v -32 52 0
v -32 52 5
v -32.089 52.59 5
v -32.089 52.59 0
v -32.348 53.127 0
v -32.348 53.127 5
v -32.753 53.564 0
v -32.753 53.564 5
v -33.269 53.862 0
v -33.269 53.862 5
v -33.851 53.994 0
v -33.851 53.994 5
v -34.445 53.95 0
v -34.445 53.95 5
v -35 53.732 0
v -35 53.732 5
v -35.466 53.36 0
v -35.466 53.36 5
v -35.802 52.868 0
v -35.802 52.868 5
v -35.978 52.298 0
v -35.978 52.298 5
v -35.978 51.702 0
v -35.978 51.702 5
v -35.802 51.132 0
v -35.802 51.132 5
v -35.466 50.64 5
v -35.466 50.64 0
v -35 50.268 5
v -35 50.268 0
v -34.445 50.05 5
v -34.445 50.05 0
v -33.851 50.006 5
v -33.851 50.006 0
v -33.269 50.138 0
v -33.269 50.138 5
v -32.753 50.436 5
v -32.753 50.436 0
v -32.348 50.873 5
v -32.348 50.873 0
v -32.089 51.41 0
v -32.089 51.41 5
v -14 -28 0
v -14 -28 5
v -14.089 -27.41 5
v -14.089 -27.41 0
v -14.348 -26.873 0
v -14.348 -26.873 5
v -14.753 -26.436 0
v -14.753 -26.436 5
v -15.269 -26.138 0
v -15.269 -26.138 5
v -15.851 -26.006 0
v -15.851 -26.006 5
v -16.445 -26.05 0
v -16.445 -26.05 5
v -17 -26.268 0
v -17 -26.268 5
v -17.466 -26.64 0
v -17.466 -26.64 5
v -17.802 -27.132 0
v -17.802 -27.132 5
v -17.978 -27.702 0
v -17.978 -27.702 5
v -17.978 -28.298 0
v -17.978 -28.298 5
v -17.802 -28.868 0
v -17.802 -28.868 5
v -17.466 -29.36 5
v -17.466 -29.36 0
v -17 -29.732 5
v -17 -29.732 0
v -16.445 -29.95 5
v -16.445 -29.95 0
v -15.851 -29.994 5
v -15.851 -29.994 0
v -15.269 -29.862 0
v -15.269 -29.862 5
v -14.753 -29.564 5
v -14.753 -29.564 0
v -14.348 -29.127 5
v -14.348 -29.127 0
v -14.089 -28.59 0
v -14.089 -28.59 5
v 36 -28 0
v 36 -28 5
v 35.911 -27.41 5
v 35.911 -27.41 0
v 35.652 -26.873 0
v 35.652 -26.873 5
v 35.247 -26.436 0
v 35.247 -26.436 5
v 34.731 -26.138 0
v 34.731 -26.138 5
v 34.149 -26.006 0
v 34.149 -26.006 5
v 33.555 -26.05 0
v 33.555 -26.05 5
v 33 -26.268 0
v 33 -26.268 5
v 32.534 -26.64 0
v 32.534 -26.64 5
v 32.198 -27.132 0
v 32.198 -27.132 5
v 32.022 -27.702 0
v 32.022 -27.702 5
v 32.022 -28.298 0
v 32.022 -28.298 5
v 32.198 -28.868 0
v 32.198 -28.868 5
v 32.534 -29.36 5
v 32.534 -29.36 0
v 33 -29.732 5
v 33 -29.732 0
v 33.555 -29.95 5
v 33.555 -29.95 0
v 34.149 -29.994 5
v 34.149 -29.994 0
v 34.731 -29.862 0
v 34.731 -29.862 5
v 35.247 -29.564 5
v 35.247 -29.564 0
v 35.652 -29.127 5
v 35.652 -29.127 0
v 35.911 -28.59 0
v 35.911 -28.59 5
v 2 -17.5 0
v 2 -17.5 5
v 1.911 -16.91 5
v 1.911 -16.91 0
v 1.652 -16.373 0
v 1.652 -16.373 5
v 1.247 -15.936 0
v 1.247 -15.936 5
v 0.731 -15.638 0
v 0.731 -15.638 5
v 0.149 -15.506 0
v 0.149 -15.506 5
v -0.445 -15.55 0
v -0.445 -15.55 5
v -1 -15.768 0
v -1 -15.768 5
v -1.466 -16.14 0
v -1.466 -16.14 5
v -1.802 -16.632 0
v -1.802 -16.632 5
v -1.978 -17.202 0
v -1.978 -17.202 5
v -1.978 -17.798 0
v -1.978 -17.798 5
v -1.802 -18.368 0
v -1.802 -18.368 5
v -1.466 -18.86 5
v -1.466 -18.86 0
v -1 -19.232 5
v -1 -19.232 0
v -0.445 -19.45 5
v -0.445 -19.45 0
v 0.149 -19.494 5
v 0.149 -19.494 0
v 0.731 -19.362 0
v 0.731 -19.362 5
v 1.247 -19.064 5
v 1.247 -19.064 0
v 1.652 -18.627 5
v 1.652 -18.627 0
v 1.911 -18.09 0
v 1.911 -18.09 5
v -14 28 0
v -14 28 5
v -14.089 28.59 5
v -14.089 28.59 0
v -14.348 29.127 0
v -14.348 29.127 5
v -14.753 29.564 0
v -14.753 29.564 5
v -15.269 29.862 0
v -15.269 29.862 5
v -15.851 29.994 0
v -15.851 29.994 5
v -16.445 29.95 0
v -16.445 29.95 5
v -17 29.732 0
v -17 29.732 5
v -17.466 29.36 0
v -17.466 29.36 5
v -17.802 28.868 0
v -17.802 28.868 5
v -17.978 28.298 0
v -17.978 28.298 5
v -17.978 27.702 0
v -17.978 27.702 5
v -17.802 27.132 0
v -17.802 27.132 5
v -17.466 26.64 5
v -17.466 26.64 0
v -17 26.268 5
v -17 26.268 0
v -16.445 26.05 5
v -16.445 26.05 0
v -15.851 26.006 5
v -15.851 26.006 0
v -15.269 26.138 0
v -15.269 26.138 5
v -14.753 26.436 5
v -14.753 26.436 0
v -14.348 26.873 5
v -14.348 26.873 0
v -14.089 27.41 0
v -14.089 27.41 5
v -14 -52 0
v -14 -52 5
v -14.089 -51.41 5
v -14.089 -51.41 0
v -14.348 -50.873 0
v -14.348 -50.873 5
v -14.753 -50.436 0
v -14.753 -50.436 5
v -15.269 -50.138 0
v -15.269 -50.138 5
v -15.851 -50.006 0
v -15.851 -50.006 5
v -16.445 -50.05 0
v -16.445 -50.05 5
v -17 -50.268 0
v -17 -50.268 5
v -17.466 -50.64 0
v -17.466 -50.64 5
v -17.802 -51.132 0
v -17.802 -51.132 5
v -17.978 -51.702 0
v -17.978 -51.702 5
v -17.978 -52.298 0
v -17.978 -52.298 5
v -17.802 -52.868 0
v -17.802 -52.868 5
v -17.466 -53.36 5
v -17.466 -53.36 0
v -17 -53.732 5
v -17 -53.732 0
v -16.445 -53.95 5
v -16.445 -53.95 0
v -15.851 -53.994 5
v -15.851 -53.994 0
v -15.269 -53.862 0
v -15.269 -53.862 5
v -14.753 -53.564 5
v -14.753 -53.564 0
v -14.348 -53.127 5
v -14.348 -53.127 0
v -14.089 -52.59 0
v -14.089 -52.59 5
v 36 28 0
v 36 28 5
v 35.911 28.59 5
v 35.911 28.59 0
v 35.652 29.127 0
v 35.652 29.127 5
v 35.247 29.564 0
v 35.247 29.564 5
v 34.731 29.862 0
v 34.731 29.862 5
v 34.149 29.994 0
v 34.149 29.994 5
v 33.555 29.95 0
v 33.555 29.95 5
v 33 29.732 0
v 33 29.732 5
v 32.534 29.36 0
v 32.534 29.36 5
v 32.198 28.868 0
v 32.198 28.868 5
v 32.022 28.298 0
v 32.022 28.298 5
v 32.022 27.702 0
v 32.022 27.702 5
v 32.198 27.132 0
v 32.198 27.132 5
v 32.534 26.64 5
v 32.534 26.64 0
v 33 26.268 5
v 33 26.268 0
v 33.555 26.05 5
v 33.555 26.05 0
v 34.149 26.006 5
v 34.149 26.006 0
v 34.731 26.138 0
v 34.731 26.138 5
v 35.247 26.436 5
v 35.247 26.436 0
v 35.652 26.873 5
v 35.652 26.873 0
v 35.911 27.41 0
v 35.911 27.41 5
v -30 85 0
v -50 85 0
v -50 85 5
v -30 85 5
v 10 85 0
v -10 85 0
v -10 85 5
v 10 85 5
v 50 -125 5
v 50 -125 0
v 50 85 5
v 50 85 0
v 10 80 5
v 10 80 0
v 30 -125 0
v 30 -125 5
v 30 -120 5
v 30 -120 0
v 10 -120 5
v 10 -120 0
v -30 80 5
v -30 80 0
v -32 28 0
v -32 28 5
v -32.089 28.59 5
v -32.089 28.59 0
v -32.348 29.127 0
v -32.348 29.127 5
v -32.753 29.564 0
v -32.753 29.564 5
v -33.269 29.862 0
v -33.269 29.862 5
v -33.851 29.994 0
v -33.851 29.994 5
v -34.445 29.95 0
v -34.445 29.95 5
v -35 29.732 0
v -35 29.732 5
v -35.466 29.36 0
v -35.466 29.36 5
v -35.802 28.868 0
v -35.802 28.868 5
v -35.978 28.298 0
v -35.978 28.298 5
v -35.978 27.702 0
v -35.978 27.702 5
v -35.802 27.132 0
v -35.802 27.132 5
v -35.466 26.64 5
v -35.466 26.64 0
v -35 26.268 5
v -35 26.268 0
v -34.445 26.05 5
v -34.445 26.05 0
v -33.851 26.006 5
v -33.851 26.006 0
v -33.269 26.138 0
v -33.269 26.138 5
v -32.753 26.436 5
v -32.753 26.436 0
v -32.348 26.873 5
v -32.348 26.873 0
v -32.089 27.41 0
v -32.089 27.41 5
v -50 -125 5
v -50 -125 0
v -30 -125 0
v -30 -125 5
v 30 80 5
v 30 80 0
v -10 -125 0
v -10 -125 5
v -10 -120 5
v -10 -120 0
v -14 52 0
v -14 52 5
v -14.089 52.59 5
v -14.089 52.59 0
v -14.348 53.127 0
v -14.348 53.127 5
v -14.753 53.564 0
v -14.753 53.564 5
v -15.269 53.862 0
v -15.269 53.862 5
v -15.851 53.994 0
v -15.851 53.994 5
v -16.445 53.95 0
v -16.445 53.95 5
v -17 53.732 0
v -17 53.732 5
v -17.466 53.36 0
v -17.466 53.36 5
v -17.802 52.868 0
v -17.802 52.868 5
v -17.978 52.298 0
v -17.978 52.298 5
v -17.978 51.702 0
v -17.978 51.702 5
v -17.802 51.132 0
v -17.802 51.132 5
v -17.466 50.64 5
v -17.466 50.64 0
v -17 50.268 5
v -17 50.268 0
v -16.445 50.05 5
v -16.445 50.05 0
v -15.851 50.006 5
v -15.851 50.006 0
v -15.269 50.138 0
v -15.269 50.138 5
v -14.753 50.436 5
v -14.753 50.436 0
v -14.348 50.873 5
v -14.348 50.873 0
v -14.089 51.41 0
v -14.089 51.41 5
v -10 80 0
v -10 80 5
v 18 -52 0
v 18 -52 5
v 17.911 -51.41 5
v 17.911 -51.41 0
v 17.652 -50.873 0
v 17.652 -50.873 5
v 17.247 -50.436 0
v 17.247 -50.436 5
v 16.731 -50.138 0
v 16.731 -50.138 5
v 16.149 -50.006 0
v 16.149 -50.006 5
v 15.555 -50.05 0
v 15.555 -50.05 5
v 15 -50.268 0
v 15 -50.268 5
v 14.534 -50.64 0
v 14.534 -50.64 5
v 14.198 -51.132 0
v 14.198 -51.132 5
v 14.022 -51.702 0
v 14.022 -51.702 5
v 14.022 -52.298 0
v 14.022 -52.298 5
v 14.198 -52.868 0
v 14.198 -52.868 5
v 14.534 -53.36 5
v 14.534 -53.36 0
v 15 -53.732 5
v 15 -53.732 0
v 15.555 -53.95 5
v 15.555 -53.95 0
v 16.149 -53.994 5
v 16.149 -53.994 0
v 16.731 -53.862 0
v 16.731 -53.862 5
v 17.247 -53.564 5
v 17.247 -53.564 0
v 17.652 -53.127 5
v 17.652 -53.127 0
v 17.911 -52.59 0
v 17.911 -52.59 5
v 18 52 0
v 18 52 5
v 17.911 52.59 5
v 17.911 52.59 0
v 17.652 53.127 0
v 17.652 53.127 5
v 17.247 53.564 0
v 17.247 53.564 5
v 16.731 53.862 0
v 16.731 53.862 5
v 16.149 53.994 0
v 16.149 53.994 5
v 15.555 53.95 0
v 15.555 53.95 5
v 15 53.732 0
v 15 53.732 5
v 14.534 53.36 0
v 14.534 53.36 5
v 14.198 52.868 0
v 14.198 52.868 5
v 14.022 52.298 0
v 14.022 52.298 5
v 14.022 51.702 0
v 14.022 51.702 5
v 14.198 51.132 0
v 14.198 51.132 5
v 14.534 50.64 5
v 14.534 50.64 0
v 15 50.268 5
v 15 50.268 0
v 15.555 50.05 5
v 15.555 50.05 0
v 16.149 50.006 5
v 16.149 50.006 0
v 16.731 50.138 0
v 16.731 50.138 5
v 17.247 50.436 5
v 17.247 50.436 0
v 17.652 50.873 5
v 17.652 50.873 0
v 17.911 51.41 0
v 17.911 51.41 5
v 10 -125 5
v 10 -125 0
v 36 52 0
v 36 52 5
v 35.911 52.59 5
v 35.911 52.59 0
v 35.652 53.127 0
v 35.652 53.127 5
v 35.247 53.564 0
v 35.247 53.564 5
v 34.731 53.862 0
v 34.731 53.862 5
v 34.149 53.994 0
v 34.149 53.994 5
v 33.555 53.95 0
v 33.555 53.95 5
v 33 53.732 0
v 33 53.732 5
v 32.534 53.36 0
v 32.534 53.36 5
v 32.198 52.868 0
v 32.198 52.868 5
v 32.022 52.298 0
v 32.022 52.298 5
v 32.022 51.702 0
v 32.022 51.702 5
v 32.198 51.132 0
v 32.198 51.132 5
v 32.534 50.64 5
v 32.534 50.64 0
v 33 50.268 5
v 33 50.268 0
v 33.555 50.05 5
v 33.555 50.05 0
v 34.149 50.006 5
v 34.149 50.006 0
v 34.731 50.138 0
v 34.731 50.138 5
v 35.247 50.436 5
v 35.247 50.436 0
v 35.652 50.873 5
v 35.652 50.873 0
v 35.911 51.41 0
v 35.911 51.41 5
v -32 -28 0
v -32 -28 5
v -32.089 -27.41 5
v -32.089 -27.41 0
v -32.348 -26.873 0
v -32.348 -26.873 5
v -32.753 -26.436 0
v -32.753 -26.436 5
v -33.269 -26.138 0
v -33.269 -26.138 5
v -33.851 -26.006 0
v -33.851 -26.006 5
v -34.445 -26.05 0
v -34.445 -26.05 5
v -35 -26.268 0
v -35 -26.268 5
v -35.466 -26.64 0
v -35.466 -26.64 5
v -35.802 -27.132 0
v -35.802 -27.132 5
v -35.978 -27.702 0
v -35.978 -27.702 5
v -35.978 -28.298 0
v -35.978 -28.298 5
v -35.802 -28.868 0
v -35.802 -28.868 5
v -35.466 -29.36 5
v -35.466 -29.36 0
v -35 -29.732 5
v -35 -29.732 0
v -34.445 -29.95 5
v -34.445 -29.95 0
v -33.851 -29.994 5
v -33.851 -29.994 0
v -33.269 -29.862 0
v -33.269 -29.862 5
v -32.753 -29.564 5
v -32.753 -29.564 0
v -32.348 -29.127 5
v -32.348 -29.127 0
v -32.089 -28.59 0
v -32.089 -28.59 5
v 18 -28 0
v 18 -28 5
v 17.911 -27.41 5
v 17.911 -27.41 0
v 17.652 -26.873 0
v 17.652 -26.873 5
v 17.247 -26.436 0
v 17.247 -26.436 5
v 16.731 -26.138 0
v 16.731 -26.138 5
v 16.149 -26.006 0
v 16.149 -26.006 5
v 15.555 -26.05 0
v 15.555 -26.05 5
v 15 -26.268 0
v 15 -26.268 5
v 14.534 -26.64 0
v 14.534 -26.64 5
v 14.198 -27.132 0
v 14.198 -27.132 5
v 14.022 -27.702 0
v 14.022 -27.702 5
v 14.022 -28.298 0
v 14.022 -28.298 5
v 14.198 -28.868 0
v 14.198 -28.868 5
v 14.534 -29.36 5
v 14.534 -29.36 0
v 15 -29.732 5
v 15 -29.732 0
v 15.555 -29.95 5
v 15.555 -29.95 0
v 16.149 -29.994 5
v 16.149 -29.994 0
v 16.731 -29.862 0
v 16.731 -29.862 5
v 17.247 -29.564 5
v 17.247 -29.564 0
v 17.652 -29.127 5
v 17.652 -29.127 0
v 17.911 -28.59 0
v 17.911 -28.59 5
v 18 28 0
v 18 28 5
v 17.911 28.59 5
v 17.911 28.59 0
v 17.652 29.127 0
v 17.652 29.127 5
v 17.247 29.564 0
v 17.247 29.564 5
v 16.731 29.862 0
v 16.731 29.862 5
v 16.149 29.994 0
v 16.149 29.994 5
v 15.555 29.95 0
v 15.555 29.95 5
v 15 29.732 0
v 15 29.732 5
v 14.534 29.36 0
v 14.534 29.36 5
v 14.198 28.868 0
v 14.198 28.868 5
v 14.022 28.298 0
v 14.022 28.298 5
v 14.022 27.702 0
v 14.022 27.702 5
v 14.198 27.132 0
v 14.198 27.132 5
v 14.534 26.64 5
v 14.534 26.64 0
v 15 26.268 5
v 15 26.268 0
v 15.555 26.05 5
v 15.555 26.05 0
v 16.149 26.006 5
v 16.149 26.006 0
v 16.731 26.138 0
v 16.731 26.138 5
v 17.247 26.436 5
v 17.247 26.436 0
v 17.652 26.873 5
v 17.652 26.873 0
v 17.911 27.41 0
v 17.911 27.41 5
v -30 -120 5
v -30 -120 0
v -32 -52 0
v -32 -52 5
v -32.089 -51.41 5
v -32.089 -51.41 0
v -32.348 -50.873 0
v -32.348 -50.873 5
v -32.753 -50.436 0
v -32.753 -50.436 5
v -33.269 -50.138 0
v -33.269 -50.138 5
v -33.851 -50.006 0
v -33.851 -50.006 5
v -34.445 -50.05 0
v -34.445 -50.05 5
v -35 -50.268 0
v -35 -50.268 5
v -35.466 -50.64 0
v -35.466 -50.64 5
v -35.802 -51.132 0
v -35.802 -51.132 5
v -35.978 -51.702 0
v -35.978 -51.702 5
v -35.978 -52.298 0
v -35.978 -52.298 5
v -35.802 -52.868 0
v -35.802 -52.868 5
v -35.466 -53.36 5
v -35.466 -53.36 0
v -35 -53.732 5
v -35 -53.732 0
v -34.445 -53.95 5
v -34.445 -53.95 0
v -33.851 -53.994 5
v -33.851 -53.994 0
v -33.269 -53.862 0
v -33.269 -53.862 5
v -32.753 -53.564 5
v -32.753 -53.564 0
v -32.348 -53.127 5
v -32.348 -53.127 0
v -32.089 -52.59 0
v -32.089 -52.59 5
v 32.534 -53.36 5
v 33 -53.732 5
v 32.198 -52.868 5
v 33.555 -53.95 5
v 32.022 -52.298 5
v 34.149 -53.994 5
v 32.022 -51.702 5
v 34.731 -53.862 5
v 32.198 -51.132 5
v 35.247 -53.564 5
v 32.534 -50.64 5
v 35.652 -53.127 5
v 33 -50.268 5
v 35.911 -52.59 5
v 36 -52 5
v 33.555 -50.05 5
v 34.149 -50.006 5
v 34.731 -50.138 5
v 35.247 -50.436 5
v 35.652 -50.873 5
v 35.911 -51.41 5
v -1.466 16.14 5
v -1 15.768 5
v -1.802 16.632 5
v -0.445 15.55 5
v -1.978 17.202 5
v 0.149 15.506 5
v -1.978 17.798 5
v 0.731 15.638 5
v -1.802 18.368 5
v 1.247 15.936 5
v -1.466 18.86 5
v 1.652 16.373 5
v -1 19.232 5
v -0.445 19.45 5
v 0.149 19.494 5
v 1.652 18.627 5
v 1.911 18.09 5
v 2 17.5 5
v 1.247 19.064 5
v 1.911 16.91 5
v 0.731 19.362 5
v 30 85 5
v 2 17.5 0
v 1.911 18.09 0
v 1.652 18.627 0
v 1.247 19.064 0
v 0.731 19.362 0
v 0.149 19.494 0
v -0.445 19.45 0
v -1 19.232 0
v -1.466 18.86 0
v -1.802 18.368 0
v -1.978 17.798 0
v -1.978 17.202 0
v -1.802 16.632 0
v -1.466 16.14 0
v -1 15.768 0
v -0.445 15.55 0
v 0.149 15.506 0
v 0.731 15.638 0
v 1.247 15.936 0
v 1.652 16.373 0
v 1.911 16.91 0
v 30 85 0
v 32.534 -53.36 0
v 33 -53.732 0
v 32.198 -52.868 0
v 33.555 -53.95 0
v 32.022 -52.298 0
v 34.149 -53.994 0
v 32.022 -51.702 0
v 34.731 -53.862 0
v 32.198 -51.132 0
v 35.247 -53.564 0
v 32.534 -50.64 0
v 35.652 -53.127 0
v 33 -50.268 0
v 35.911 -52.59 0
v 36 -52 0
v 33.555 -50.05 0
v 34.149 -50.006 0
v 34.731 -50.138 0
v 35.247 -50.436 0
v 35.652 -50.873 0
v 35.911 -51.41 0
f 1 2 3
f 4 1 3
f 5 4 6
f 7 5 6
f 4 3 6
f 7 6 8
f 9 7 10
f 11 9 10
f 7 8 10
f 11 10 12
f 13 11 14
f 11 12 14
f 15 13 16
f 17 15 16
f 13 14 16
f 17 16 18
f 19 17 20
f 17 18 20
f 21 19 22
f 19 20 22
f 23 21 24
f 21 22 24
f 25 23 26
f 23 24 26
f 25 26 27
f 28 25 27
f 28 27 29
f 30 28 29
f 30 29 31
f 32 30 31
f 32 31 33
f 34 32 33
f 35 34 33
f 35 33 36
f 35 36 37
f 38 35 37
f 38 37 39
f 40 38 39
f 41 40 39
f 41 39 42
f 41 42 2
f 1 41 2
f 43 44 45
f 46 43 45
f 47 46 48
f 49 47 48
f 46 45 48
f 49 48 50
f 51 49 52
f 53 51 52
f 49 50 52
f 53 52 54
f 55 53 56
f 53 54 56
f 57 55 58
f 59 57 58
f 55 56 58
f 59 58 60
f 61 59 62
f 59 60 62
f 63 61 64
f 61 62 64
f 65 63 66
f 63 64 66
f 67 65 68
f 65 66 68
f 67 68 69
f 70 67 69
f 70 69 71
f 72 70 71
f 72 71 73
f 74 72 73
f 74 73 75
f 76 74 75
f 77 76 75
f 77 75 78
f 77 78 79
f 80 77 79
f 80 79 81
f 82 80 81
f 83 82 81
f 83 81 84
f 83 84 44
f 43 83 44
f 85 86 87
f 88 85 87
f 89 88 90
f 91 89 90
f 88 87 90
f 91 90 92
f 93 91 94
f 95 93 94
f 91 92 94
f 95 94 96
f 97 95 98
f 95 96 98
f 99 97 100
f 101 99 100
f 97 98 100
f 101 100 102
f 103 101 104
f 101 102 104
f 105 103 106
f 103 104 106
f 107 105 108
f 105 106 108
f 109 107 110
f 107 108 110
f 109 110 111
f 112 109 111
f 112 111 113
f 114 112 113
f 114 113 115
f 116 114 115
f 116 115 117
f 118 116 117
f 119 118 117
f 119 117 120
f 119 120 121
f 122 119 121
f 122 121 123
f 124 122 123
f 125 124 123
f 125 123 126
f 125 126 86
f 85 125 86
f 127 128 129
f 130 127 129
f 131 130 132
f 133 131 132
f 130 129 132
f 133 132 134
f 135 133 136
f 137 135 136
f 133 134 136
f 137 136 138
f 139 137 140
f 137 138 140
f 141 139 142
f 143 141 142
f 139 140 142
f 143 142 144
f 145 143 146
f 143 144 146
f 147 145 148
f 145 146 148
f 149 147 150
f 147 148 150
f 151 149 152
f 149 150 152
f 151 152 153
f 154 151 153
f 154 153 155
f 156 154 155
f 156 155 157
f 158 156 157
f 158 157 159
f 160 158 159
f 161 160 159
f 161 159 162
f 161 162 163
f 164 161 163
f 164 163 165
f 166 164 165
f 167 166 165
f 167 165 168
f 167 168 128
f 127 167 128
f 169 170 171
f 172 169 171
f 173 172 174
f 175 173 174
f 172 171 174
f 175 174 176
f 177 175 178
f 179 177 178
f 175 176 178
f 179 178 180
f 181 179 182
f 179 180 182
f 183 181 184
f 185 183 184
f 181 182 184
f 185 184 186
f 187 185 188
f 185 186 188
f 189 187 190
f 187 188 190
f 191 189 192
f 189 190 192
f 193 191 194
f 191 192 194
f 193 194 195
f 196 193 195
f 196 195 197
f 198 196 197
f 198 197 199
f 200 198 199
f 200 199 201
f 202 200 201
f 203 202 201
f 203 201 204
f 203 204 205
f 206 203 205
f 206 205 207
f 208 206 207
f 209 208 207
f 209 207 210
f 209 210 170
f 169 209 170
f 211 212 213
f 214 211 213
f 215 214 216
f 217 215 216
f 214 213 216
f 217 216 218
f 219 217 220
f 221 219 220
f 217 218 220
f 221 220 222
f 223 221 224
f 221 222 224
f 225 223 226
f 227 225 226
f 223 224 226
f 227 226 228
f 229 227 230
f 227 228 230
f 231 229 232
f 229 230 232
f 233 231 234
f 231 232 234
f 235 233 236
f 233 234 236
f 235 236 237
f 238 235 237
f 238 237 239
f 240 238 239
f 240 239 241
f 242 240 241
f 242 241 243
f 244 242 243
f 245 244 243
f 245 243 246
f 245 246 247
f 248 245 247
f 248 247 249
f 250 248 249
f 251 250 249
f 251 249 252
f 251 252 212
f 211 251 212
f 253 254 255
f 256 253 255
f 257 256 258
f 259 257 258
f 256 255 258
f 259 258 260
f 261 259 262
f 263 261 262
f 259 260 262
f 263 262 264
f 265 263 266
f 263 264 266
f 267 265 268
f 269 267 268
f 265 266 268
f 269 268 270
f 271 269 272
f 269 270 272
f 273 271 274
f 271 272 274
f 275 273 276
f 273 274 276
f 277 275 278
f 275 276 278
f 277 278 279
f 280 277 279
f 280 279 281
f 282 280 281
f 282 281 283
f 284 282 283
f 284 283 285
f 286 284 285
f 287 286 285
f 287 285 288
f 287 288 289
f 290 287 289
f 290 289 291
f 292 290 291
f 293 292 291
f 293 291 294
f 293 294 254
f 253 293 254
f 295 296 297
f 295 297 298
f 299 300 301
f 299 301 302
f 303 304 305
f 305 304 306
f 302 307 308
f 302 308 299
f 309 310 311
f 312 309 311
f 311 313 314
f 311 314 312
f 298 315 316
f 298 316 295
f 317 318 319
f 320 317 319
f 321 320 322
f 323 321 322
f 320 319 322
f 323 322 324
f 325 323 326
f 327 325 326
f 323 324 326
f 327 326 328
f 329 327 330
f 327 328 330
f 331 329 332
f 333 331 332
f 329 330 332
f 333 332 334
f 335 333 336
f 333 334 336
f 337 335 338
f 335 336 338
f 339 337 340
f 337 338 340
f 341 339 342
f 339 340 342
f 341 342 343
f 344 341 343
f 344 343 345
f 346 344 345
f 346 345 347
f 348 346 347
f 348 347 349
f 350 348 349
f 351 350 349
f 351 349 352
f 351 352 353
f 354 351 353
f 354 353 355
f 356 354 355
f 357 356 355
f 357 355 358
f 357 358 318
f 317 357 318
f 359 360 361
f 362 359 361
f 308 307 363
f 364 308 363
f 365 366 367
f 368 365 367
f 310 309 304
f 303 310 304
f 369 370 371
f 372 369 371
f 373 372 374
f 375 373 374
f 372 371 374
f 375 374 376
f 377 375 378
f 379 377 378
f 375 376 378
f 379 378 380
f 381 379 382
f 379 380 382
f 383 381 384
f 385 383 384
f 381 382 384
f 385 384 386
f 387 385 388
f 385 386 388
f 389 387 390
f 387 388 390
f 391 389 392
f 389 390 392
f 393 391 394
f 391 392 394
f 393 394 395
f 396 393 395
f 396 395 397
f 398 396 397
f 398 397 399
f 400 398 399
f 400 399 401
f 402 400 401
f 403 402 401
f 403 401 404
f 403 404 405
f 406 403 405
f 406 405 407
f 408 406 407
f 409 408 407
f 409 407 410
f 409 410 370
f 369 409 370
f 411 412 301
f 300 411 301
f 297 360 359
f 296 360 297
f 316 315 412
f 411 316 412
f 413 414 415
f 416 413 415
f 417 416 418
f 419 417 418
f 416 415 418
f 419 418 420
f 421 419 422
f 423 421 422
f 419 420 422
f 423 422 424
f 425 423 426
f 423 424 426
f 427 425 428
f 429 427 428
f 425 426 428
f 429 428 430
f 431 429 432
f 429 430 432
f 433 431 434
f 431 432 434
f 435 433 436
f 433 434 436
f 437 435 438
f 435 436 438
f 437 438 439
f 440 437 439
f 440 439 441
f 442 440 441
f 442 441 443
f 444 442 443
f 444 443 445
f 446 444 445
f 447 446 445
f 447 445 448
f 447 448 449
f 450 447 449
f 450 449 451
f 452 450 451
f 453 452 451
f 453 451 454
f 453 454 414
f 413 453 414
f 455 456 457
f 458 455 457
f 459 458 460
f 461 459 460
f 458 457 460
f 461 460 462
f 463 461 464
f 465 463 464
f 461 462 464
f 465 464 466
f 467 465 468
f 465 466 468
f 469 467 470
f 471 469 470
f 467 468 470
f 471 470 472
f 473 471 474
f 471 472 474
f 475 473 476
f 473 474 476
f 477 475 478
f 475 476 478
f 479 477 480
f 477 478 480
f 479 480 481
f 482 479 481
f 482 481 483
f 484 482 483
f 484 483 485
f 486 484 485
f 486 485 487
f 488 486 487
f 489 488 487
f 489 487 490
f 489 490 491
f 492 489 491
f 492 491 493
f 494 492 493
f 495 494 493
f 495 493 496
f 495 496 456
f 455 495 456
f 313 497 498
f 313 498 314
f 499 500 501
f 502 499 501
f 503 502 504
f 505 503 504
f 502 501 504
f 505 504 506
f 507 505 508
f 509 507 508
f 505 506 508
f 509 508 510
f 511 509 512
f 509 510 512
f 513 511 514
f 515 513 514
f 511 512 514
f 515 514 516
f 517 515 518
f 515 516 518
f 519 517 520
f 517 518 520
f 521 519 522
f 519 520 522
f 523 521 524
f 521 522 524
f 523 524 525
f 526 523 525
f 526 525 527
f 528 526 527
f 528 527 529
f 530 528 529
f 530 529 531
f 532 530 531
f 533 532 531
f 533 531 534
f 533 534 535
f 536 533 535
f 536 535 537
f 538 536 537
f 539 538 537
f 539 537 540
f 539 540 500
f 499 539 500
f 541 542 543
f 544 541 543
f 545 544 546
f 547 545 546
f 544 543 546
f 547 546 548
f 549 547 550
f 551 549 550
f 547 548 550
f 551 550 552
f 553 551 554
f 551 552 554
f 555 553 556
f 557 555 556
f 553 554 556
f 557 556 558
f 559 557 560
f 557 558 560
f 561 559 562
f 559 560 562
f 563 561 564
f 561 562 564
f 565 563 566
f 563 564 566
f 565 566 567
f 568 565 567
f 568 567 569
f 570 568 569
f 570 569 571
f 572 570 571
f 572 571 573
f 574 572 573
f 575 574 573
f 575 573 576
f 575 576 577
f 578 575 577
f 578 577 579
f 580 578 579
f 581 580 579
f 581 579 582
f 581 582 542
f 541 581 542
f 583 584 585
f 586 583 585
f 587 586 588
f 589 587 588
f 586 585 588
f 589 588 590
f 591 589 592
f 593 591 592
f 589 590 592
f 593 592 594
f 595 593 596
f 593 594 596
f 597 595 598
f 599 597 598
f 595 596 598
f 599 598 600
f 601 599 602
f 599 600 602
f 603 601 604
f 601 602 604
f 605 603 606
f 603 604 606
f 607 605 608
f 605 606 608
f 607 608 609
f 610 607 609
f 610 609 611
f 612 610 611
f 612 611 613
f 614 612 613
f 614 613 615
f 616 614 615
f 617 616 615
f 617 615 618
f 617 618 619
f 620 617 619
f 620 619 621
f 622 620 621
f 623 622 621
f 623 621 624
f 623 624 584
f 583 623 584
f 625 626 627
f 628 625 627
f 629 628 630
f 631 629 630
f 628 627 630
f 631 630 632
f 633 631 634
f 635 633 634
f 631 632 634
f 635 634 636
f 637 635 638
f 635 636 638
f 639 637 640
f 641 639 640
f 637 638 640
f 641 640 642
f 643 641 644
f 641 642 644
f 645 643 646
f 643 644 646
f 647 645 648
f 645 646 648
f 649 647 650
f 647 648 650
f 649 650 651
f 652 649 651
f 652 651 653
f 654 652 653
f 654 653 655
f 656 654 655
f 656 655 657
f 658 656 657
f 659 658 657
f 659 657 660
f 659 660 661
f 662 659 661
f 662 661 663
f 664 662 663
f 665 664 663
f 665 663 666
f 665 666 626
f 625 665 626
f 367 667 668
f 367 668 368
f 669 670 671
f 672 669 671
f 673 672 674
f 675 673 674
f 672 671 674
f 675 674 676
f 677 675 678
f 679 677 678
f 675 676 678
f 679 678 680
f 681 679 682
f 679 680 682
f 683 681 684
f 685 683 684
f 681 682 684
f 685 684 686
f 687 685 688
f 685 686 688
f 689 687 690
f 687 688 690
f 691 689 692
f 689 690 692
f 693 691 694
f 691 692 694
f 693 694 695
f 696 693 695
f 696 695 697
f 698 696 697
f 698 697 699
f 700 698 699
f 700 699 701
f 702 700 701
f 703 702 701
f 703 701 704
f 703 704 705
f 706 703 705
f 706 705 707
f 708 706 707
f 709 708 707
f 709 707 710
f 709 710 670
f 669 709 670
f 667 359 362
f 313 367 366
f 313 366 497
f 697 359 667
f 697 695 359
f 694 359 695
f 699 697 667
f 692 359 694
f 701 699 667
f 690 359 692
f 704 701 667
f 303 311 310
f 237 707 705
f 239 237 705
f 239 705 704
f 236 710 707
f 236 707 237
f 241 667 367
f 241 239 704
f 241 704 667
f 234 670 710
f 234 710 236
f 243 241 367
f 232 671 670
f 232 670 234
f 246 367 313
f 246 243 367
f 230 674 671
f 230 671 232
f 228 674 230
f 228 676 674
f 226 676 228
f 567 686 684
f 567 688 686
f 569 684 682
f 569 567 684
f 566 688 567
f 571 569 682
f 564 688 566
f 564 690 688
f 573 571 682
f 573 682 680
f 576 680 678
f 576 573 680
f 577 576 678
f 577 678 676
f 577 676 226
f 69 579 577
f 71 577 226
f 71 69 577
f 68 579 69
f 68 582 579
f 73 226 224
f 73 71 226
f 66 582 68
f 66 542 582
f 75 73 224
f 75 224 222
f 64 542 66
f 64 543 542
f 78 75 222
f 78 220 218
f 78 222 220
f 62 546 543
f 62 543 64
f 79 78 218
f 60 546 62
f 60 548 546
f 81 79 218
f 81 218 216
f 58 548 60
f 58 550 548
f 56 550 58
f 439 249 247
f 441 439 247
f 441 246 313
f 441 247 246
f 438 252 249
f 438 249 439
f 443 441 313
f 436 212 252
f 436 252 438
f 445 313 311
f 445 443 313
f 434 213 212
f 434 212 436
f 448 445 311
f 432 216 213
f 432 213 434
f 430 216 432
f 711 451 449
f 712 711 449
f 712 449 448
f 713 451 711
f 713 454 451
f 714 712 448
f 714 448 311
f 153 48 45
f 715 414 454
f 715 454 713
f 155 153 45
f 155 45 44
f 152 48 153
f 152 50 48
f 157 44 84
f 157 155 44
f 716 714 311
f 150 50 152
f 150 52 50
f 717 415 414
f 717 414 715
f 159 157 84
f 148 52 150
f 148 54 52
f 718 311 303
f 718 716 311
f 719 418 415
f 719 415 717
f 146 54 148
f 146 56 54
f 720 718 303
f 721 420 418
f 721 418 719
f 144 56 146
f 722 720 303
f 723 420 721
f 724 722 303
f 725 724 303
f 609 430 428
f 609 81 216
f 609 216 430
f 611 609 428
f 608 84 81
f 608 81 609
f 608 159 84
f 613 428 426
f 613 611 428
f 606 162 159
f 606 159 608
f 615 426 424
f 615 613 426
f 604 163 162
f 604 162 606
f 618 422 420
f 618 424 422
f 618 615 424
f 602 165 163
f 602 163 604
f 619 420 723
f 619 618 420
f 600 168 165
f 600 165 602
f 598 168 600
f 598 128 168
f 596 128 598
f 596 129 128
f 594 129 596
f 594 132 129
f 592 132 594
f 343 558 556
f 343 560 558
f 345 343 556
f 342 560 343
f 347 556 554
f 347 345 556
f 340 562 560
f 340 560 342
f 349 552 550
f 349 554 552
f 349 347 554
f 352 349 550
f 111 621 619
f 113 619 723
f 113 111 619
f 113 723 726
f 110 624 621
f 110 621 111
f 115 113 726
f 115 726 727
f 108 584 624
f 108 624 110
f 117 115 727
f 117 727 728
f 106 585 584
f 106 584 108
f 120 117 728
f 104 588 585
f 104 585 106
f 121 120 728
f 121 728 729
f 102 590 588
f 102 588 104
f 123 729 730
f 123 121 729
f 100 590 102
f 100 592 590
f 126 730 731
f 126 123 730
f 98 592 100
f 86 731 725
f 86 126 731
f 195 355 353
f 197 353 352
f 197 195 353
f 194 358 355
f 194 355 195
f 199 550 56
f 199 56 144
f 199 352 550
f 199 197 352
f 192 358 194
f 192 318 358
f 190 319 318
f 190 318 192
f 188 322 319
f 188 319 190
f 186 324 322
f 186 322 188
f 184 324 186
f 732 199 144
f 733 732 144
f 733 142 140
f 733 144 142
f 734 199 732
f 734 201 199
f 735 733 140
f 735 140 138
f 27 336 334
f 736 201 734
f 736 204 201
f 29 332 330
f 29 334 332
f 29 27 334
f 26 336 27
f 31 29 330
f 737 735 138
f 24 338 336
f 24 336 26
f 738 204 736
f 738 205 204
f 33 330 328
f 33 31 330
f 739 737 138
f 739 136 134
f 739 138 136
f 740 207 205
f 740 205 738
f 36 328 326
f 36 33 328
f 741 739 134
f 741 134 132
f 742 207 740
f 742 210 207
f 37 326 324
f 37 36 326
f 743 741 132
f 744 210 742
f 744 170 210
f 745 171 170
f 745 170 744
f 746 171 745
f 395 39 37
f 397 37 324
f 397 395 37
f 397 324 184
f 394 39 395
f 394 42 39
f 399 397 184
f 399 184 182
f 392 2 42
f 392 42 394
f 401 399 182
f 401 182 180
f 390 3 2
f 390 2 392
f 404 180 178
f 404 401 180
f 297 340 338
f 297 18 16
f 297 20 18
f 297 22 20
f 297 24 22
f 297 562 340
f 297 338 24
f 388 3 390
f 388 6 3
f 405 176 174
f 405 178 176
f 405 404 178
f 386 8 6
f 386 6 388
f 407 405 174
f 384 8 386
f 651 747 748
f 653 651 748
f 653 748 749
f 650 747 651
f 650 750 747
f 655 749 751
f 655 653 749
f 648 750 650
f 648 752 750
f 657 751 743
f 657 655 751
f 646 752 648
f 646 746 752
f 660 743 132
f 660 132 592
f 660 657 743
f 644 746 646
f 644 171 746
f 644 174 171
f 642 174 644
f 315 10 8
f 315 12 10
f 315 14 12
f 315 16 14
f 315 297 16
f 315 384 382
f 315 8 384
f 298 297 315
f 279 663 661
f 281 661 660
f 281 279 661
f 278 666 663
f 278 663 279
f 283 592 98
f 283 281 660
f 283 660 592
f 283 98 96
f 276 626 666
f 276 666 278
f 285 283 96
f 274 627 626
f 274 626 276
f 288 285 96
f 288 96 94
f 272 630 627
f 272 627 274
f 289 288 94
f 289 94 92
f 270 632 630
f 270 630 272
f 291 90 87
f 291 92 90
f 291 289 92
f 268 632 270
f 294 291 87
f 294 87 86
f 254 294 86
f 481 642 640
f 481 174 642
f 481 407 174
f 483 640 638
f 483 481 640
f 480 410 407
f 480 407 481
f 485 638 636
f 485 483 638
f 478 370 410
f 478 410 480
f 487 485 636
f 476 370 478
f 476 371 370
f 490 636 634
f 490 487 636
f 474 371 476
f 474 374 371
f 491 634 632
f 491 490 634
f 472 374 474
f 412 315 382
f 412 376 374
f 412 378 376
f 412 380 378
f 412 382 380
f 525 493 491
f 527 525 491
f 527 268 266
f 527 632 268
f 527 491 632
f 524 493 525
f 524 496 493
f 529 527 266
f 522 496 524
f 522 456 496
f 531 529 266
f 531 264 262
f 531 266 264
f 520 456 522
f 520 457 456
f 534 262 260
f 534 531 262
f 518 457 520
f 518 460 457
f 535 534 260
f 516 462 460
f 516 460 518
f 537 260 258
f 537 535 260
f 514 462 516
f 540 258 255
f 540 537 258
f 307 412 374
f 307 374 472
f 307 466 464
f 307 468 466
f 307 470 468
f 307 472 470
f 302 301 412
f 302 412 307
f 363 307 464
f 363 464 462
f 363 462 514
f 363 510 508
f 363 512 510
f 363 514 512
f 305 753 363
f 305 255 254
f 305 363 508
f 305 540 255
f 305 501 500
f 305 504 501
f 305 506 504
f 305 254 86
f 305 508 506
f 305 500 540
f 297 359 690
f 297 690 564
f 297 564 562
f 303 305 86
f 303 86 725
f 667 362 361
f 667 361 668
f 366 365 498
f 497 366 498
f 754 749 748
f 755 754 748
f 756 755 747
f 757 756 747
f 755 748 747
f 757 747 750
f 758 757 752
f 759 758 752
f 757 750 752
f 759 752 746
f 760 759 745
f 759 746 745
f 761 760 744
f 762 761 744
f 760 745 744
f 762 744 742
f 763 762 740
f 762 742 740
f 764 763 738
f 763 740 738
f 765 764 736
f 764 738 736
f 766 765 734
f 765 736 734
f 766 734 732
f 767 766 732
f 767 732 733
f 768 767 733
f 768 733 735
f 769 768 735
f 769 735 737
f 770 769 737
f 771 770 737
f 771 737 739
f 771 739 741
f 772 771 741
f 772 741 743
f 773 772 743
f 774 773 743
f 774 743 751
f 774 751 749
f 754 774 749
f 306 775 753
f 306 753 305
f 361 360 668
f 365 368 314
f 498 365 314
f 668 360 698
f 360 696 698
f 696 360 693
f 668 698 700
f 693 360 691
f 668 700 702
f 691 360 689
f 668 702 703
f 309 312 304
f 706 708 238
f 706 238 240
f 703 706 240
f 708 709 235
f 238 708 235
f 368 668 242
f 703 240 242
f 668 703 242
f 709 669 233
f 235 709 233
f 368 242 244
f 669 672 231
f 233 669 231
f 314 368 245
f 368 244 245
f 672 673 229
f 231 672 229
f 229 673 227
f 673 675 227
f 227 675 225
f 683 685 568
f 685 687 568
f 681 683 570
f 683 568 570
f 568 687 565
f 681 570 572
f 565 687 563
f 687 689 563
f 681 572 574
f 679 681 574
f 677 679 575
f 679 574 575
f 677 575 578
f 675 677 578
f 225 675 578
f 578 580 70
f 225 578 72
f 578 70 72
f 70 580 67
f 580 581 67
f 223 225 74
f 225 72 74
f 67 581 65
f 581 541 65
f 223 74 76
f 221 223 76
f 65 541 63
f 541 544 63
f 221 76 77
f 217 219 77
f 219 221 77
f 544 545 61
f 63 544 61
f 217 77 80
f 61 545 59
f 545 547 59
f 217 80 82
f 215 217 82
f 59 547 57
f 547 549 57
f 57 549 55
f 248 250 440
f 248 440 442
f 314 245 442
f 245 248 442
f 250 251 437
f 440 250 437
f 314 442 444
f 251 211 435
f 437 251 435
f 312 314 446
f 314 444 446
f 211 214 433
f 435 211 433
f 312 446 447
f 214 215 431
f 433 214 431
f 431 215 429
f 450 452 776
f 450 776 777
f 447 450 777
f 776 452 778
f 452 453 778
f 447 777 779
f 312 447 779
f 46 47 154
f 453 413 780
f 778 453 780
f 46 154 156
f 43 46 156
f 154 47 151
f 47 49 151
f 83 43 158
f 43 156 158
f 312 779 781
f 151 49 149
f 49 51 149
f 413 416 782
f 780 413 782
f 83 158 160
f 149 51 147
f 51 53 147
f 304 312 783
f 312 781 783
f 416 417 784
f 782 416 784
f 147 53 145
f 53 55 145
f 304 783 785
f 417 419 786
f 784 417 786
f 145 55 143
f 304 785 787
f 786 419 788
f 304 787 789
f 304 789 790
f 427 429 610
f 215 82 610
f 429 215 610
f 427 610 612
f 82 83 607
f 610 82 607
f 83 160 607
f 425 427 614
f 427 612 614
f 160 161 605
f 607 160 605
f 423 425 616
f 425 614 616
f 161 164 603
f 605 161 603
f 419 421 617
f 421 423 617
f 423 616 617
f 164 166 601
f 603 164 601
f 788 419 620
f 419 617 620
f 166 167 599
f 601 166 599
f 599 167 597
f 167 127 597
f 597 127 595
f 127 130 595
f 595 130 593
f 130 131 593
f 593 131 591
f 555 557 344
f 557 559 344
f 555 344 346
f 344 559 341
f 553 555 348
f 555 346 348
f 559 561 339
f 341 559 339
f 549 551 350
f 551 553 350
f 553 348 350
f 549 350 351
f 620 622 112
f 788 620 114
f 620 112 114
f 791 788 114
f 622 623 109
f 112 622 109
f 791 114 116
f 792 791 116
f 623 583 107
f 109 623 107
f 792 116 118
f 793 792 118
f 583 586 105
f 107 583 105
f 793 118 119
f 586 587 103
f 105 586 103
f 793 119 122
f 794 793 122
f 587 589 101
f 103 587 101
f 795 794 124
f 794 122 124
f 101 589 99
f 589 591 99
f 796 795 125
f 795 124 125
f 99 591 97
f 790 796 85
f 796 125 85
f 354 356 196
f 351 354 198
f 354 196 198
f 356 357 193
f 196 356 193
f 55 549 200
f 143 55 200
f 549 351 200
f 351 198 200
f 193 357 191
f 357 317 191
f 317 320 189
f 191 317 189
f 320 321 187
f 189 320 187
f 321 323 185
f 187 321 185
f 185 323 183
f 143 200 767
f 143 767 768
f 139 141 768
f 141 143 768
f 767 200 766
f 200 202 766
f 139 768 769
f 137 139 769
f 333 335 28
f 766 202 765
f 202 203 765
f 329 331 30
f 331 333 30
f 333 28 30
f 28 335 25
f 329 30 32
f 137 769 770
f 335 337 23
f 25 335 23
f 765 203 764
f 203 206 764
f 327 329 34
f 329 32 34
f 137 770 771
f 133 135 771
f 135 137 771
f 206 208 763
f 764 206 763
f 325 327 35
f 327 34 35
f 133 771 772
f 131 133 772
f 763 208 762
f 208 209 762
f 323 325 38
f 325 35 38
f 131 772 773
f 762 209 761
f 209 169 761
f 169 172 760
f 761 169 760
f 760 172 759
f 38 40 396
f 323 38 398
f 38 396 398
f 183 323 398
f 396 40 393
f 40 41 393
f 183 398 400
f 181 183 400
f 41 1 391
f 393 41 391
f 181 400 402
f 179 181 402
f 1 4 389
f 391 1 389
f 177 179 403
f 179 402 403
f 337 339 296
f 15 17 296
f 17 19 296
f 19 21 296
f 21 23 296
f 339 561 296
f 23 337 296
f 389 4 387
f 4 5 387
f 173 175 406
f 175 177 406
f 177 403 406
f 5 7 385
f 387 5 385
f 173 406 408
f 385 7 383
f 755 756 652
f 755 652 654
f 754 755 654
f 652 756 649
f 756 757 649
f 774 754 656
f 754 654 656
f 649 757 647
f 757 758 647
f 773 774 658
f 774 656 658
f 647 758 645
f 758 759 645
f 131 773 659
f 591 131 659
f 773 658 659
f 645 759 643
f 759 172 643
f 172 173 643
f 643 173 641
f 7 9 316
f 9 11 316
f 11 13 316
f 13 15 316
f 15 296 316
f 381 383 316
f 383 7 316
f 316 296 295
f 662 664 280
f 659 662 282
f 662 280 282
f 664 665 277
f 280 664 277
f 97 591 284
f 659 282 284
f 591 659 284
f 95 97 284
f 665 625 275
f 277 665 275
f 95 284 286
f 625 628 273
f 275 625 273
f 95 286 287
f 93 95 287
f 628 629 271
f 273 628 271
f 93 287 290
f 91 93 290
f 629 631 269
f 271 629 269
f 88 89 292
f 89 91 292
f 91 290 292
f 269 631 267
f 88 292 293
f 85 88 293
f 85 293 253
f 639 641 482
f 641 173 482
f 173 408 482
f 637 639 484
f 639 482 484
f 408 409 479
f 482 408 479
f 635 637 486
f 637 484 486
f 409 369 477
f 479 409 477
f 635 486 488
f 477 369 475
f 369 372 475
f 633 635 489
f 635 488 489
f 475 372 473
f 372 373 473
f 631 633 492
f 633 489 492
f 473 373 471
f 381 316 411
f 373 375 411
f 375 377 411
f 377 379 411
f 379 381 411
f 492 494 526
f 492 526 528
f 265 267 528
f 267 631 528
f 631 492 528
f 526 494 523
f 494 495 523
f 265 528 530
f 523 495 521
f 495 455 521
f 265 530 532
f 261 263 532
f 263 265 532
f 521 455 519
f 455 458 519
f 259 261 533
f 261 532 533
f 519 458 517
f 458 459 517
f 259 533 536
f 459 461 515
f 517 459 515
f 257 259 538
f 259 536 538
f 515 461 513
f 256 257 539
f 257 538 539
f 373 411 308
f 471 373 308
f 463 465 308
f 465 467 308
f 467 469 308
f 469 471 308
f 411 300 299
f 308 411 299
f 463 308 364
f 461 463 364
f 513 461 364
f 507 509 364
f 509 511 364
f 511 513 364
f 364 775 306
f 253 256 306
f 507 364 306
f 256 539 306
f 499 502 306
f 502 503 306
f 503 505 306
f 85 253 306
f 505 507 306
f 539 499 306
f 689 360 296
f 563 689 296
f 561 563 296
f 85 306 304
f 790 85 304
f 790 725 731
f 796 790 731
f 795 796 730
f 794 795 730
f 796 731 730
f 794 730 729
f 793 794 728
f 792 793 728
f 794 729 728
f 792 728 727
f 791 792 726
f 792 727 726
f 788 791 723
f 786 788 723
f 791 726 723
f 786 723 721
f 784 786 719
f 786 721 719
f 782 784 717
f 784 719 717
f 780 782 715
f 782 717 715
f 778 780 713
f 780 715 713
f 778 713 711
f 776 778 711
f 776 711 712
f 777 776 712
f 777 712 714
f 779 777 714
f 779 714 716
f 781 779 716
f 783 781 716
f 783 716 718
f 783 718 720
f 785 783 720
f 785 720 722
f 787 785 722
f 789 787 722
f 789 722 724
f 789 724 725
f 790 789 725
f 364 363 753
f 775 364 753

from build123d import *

# Parameters (mm, degrees)
SKETCH1_W           = 100
SKETCH1_H           = 210
BOSS_EXTRUDE1_DEPTH = 5
SKETCH4_W           = 20
SKETCH4_H           = 5
CUT_EXTRUDE3_DEPTH  = 10
SKETCH5_R           = 2
CUT_EXTRUDE4_DEPTH  = 6
SKETCH7_R           = 2
CUT_EXTRUDE5_DEPTH  = 10


with BuildPart() as part:
    # Sketch1 → Boss-Extrude1 (new body)
    with BuildSketch(Plane.XY):
        with Locations((0, -20)):
            Rectangle(SKETCH1_W, SKETCH1_H)
    extrude(amount=BOSS_EXTRUDE1_DEPTH)

    # Sketch4 → Cut-Extrude3 (cut)
    with BuildSketch(Plane.XY.offset(5)):
        with Locations((-20, 82.5)):
            Rectangle(SKETCH4_W, SKETCH4_H)
        with Locations((20, 82.5)):
            Rectangle(SKETCH4_W, SKETCH4_H)
        with Locations((20, -122.5)):
            Rectangle(SKETCH4_W, SKETCH4_H)
        with Locations((-20, -122.5)):
            Rectangle(SKETCH4_W, SKETCH4_H)
    extrude(amount=-CUT_EXTRUDE3_DEPTH, mode=Mode.SUBTRACT)

    # Sketch5 → Cut-Extrude4 (cut, through all)
    with BuildSketch(Plane.XY.offset(5)):
        with Locations((34, 52)):
            Circle(SKETCH5_R)
        with Locations((16, 52)):
            Circle(SKETCH5_R)
        with Locations((16, 28)):
            Circle(SKETCH5_R)
        with Locations((34, 28)):
            Circle(SKETCH5_R)
        with Locations((-16, 28)):
            Circle(SKETCH5_R)
        with Locations((-34, 28)):
            Circle(SKETCH5_R)
        with Locations((-34, 52)):
            Circle(SKETCH5_R)
        with Locations((-16, 52)):
            Circle(SKETCH5_R)
        with Locations((-16, -52)):
            Circle(SKETCH5_R)
        with Locations((-34, -52)):
            Circle(SKETCH5_R)
        with Locations((-34, -28)):
            Circle(SKETCH5_R)
        with Locations((-16, -28)):
            Circle(SKETCH5_R)
        with Locations((16, -28)):
            Circle(SKETCH5_R)
        with Locations((34, -28)):
            Circle(SKETCH5_R)
        with Locations((34, -52)):
            Circle(SKETCH5_R)
        with Locations((16, -52)):
            Circle(SKETCH5_R)
    extrude(amount=-CUT_EXTRUDE4_DEPTH, mode=Mode.SUBTRACT)

    # Sketch7 → Cut-Extrude5 (cut)
    with BuildSketch(Plane.XY.offset(5)):
        with Locations((0, 17.5)):
            Circle(SKETCH7_R)
        with Locations((0, -17.5)):
            Circle(SKETCH7_R)
    extrude(amount=-CUT_EXTRUDE5_DEPTH, mode=Mode.SUBTRACT)


solid = part.part
